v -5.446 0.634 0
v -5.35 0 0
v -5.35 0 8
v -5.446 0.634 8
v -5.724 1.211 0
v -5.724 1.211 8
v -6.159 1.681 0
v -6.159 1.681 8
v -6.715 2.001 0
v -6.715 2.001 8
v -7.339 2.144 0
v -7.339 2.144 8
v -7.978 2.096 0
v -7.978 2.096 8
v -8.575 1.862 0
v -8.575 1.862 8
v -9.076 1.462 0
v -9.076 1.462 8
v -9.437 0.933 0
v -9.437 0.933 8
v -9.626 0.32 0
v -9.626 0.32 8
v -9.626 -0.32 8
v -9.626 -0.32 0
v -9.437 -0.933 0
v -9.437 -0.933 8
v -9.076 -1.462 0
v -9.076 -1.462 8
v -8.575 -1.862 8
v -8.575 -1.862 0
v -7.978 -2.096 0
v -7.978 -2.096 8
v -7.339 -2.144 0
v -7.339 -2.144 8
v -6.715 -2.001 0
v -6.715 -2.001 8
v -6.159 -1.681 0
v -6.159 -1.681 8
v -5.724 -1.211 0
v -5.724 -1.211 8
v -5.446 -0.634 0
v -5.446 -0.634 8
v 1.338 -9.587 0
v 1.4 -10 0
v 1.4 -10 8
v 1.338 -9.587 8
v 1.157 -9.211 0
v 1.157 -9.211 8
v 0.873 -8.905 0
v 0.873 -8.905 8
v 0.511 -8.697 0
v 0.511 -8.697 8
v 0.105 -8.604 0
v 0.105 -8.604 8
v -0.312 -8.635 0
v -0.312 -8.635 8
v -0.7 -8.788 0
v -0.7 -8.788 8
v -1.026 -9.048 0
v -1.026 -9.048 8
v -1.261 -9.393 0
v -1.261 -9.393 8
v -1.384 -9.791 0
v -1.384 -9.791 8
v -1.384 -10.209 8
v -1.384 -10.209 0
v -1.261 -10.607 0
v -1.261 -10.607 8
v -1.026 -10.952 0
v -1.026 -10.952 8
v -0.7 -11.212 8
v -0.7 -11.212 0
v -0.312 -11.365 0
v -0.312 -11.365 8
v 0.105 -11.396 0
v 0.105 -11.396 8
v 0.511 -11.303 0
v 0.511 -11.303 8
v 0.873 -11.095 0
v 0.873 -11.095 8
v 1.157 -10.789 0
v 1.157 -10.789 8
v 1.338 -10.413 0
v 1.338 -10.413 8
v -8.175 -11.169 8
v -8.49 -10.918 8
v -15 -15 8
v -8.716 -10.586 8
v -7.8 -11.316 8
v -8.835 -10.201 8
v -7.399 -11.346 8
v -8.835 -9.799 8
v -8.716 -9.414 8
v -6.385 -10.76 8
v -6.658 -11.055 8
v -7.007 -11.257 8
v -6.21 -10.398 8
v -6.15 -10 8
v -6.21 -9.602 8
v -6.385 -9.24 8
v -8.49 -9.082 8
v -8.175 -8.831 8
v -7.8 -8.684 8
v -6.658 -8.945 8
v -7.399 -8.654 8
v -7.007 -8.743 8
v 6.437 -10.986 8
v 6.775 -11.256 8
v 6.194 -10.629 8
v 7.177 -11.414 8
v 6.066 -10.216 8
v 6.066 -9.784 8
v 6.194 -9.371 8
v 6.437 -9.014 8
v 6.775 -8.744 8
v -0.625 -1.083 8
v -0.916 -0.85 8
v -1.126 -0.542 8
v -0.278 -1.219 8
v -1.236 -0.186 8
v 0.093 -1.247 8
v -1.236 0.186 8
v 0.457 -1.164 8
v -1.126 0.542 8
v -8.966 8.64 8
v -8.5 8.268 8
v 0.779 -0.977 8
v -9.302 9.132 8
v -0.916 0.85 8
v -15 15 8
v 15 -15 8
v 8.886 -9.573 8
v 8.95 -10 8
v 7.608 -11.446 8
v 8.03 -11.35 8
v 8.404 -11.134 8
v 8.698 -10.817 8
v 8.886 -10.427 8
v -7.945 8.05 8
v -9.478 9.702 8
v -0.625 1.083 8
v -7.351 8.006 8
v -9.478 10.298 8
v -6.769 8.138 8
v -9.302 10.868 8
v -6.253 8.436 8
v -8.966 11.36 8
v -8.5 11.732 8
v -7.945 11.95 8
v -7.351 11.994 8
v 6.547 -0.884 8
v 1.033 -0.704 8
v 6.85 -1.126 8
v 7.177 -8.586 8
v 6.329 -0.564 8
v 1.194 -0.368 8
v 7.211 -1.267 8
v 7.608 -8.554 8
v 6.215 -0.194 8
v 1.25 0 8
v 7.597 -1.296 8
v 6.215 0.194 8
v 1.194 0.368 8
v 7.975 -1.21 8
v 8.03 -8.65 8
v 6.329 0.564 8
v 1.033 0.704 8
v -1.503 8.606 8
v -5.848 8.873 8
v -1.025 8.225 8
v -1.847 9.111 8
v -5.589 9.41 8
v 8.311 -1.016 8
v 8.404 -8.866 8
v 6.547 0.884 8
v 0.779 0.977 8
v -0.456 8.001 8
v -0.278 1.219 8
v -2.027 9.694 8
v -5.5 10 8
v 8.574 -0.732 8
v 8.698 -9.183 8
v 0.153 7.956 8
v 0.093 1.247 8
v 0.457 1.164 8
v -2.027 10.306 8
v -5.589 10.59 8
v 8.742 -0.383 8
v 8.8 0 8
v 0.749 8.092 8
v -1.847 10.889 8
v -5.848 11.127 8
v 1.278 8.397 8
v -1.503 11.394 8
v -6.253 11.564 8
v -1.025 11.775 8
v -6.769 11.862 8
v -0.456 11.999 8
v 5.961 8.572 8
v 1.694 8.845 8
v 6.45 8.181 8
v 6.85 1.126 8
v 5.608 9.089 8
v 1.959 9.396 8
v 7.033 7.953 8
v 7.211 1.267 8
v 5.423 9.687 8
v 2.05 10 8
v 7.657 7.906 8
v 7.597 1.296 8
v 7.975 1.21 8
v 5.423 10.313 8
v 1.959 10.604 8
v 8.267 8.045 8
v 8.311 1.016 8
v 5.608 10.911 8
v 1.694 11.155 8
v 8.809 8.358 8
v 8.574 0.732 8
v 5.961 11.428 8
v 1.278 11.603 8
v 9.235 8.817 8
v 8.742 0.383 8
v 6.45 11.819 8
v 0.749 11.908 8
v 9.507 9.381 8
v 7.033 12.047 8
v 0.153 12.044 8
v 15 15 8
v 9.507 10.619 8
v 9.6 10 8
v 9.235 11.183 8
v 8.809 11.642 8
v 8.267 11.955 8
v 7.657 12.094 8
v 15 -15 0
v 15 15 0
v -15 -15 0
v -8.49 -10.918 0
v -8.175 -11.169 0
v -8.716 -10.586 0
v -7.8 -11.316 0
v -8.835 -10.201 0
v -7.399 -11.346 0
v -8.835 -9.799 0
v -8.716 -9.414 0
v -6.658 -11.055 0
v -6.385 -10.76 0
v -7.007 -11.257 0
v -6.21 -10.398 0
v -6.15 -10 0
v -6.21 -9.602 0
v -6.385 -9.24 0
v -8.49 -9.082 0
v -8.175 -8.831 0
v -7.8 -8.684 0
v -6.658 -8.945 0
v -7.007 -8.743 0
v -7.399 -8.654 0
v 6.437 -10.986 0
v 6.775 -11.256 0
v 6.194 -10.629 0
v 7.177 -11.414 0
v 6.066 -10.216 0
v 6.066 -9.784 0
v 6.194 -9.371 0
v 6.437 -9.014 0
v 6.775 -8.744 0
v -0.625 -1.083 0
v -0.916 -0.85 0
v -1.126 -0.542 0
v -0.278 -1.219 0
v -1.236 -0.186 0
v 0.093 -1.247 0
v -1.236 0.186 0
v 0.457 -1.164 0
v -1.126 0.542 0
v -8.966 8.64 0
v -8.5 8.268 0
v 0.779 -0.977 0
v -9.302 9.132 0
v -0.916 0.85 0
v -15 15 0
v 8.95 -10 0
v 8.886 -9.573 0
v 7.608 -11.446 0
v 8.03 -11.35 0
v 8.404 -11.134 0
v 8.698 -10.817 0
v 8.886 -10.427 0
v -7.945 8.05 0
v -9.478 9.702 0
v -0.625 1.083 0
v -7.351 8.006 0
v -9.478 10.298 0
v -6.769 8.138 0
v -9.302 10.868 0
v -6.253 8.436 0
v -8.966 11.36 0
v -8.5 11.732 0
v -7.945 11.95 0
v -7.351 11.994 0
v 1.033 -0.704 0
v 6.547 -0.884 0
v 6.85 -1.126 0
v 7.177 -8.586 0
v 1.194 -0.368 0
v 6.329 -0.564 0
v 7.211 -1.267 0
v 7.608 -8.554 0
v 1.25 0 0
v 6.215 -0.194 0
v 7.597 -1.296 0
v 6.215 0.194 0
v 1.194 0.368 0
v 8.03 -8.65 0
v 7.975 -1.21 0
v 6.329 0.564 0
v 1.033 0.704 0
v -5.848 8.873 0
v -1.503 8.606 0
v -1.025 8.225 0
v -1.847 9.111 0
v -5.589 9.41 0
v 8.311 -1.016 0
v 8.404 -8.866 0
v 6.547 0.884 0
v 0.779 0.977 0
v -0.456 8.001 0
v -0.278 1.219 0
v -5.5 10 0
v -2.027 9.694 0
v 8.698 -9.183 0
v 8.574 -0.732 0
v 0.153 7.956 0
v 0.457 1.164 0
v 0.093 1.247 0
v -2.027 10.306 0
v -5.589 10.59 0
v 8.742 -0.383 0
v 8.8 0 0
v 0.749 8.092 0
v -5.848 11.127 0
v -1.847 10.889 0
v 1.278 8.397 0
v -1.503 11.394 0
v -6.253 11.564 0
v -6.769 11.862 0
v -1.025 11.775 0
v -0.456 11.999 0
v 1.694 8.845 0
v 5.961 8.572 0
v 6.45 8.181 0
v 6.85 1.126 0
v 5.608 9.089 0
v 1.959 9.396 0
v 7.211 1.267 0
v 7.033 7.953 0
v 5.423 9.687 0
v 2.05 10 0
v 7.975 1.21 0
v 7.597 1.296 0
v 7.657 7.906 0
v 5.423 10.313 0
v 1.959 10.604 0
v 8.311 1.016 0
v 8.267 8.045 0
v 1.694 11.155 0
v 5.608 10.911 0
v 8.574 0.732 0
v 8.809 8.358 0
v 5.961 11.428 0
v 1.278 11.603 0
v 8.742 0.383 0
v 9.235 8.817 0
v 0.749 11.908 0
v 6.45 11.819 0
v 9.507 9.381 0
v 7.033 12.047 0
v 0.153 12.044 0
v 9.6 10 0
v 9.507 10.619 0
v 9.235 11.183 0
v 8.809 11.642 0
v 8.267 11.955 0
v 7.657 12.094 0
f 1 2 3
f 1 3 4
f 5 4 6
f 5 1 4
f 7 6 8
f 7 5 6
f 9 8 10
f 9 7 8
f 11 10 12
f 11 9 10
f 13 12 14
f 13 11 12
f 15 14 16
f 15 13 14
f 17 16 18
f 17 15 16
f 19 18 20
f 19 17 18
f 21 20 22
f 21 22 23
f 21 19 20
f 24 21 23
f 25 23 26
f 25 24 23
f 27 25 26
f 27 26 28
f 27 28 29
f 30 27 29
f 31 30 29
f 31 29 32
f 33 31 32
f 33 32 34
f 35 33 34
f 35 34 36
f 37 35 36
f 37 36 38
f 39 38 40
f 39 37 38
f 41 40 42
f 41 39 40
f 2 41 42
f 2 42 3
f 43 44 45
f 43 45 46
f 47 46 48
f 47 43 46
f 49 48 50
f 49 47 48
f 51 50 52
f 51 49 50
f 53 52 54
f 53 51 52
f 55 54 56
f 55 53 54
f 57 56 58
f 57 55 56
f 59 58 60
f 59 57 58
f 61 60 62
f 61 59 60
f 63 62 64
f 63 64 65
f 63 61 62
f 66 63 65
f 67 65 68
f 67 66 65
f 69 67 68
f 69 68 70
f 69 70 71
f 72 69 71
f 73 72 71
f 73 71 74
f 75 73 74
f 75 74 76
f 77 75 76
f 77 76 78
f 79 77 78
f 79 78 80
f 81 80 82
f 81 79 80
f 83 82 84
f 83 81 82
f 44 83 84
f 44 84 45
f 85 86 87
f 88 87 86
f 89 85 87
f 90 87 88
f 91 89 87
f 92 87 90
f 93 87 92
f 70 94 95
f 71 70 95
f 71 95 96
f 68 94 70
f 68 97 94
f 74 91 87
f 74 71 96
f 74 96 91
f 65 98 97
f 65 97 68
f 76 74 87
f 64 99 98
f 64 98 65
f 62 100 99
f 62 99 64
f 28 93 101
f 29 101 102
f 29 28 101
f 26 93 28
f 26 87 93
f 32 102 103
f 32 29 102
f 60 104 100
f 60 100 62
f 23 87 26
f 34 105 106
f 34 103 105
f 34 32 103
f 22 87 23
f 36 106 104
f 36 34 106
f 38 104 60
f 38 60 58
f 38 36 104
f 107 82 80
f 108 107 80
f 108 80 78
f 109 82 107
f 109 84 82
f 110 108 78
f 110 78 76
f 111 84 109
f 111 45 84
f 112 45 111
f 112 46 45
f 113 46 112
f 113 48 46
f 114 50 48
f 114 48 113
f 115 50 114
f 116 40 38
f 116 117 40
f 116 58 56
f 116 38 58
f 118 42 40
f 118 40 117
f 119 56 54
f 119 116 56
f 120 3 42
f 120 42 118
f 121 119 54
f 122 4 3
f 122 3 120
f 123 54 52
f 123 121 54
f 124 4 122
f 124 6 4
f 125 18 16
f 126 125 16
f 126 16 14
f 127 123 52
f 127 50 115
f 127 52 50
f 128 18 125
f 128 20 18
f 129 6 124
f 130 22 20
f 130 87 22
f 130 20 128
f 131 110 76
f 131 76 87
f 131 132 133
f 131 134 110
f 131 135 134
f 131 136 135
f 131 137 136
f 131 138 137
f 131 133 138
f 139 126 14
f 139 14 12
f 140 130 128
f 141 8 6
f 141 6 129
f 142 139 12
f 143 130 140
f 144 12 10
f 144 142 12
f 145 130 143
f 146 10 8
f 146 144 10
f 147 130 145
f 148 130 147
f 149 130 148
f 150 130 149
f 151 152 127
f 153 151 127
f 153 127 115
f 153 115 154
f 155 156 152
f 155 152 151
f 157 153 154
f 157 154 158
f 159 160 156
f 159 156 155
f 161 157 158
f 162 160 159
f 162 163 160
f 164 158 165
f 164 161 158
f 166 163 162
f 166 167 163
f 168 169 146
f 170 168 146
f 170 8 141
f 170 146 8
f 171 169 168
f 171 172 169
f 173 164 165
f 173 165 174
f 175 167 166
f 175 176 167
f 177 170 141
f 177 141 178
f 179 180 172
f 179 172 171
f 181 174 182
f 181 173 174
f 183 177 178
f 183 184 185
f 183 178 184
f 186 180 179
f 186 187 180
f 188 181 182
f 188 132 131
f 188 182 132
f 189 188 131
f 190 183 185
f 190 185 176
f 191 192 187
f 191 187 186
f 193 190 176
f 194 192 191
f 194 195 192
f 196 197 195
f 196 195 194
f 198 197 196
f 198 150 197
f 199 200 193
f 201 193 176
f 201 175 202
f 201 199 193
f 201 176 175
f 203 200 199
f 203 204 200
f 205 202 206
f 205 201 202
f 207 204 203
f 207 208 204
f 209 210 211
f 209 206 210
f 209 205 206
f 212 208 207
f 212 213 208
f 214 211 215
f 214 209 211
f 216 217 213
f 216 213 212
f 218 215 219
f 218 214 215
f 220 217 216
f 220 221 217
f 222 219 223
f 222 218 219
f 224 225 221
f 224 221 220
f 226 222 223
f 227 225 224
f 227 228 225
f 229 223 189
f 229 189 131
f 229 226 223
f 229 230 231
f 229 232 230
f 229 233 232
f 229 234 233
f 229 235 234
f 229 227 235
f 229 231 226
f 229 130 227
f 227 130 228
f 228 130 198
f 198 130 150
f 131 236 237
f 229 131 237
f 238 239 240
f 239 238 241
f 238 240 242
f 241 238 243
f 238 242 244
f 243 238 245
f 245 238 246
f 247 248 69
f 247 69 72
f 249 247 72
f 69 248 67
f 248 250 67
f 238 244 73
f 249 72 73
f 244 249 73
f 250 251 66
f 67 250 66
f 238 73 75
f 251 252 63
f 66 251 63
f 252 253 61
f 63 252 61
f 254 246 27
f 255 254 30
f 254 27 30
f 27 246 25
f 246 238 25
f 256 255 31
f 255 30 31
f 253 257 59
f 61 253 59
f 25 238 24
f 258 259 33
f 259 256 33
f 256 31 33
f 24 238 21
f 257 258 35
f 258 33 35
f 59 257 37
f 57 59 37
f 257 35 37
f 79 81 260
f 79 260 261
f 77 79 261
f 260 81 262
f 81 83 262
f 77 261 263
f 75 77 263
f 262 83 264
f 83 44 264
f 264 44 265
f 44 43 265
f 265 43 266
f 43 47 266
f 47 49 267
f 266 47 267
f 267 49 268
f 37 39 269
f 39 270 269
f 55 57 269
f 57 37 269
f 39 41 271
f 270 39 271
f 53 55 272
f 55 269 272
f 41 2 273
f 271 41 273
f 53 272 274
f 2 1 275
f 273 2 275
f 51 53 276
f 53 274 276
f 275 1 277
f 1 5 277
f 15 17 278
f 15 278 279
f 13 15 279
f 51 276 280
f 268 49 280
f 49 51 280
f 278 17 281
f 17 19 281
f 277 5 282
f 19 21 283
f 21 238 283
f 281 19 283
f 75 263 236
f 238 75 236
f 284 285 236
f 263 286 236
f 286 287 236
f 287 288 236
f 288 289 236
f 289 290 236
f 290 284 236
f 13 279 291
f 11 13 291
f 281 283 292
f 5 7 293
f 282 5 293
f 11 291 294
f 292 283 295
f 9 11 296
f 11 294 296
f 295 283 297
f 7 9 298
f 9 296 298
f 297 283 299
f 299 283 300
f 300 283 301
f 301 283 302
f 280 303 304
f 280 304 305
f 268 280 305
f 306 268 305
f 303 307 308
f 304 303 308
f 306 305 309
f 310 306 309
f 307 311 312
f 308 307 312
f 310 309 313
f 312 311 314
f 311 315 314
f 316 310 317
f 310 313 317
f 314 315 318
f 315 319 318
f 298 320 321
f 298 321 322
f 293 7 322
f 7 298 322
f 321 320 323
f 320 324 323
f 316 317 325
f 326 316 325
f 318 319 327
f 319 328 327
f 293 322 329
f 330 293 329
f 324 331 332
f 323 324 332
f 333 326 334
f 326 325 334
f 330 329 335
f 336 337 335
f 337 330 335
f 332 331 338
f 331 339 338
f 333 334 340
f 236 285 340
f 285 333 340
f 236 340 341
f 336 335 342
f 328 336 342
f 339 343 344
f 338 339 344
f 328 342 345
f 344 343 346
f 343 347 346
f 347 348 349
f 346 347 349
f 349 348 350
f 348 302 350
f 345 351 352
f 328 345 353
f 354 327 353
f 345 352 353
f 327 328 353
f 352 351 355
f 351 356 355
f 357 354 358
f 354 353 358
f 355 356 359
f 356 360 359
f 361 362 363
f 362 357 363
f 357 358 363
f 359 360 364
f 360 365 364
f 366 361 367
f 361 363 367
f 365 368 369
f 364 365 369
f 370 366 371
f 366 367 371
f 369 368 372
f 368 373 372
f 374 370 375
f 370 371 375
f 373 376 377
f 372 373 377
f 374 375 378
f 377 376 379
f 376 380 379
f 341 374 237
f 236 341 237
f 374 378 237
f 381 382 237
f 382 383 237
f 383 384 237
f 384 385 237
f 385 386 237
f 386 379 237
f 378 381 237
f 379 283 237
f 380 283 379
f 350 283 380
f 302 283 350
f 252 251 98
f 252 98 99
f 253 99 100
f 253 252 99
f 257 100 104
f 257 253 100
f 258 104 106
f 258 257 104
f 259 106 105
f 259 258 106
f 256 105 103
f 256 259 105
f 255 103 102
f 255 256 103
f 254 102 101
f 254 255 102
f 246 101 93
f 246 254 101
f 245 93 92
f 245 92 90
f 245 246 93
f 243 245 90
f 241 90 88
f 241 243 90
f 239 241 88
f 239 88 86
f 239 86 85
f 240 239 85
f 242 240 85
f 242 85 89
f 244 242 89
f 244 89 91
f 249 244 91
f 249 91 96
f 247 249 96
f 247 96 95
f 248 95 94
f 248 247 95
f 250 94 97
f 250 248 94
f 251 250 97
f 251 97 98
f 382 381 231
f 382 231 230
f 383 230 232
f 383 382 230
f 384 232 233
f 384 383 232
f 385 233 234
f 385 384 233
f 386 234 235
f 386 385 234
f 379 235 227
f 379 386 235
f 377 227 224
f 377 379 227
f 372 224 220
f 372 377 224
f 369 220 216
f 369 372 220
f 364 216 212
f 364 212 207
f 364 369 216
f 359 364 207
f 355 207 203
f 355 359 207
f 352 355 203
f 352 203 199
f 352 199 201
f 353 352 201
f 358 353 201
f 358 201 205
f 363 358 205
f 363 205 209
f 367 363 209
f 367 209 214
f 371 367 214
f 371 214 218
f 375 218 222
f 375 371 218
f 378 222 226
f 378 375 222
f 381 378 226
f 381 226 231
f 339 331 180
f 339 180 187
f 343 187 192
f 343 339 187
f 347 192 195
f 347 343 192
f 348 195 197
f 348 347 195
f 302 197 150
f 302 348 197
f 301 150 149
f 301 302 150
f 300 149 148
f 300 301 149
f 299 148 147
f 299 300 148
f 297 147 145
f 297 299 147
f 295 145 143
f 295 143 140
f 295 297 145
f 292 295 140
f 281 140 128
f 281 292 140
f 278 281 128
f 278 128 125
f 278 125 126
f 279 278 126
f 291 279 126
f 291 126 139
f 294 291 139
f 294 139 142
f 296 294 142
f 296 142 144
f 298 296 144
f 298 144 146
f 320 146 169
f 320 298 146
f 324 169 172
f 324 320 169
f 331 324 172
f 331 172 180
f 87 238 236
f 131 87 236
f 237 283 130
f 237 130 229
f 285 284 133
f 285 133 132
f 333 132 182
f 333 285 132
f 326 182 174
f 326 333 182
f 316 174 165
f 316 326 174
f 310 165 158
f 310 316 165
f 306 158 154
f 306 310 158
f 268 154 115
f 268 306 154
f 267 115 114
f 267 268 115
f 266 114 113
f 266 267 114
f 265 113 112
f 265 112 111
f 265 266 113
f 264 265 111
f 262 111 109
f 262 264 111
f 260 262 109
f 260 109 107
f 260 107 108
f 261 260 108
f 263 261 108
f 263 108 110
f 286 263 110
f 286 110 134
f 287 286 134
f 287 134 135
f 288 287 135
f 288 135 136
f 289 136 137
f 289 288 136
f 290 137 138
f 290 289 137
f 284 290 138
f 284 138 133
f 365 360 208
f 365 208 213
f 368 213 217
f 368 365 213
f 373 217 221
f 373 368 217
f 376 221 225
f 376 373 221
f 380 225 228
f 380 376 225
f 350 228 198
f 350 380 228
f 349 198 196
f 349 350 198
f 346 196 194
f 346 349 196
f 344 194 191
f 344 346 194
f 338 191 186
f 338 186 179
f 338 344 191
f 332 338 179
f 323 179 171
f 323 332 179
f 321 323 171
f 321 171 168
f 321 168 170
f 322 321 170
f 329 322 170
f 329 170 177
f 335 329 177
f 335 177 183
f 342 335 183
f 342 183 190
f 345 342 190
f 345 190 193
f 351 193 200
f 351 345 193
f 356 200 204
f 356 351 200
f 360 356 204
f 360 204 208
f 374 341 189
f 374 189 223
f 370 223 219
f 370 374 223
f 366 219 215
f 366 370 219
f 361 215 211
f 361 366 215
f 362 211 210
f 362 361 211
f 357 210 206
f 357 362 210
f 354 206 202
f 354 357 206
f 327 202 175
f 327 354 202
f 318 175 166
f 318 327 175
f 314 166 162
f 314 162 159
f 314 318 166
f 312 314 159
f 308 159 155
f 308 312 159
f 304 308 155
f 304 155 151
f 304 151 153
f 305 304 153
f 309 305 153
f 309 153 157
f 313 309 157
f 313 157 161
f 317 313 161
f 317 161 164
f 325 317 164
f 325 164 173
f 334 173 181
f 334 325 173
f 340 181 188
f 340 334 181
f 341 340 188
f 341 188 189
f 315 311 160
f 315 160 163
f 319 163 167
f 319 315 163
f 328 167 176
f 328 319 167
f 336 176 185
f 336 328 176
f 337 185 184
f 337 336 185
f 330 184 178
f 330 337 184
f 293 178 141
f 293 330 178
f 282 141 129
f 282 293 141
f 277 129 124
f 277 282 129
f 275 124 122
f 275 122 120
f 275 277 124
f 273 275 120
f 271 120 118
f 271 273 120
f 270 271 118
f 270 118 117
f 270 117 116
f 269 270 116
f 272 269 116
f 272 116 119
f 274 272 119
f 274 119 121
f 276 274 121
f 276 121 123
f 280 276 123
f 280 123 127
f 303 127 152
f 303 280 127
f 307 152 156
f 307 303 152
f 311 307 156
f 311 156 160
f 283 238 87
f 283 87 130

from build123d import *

# Parameters (mm, degrees)
SKETCH_W   = 30
SKETCH_H   = 30
SKETCH_R   = 2
SKETCH_R_2 = 2.05
SKETCH_R_3 = 2.1
SKETCH_R_4 = 2.15
SKETCH_R_5 = 1.25
SKETCH_R_6 = 1.45
SKETCH_R_7 = 1.4
SKETCH_R_8 = 1.35
SKETCH_R_9 = 1.3
PAD_DEPTH  = 8


with BuildPart() as part:
    # Sketch → Pad (new body)
    with BuildSketch(Plane.XY):
        Rectangle(SKETCH_W, SKETCH_H)
        with Locations((-7.5, 10)):
            Circle(SKETCH_R, mode=Mode.SUBTRACT)
        with Locations((0, 10)):
            Circle(SKETCH_R_2, mode=Mode.SUBTRACT)
        with Locations((7.5, 10)):
            Circle(SKETCH_R_3, mode=Mode.SUBTRACT)
        with Locations((-7.5, 0)):
            Circle(SKETCH_R_4, mode=Mode.SUBTRACT)
        Circle(SKETCH_R_5, mode=Mode.SUBTRACT)
        with Locations((7.5, -10)):
            Circle(SKETCH_R_6, mode=Mode.SUBTRACT)
        with Locations((0, -10)):
            Circle(SKETCH_R_7, mode=Mode.SUBTRACT)
        with Locations((-7.5, -10)):
            Circle(SKETCH_R_8, mode=Mode.SUBTRACT)
        with Locations((7.5, 0)):
            Circle(SKETCH_R_9, mode=Mode.SUBTRACT)
    extrude(amount=PAD_DEPTH)


solid = part.part
